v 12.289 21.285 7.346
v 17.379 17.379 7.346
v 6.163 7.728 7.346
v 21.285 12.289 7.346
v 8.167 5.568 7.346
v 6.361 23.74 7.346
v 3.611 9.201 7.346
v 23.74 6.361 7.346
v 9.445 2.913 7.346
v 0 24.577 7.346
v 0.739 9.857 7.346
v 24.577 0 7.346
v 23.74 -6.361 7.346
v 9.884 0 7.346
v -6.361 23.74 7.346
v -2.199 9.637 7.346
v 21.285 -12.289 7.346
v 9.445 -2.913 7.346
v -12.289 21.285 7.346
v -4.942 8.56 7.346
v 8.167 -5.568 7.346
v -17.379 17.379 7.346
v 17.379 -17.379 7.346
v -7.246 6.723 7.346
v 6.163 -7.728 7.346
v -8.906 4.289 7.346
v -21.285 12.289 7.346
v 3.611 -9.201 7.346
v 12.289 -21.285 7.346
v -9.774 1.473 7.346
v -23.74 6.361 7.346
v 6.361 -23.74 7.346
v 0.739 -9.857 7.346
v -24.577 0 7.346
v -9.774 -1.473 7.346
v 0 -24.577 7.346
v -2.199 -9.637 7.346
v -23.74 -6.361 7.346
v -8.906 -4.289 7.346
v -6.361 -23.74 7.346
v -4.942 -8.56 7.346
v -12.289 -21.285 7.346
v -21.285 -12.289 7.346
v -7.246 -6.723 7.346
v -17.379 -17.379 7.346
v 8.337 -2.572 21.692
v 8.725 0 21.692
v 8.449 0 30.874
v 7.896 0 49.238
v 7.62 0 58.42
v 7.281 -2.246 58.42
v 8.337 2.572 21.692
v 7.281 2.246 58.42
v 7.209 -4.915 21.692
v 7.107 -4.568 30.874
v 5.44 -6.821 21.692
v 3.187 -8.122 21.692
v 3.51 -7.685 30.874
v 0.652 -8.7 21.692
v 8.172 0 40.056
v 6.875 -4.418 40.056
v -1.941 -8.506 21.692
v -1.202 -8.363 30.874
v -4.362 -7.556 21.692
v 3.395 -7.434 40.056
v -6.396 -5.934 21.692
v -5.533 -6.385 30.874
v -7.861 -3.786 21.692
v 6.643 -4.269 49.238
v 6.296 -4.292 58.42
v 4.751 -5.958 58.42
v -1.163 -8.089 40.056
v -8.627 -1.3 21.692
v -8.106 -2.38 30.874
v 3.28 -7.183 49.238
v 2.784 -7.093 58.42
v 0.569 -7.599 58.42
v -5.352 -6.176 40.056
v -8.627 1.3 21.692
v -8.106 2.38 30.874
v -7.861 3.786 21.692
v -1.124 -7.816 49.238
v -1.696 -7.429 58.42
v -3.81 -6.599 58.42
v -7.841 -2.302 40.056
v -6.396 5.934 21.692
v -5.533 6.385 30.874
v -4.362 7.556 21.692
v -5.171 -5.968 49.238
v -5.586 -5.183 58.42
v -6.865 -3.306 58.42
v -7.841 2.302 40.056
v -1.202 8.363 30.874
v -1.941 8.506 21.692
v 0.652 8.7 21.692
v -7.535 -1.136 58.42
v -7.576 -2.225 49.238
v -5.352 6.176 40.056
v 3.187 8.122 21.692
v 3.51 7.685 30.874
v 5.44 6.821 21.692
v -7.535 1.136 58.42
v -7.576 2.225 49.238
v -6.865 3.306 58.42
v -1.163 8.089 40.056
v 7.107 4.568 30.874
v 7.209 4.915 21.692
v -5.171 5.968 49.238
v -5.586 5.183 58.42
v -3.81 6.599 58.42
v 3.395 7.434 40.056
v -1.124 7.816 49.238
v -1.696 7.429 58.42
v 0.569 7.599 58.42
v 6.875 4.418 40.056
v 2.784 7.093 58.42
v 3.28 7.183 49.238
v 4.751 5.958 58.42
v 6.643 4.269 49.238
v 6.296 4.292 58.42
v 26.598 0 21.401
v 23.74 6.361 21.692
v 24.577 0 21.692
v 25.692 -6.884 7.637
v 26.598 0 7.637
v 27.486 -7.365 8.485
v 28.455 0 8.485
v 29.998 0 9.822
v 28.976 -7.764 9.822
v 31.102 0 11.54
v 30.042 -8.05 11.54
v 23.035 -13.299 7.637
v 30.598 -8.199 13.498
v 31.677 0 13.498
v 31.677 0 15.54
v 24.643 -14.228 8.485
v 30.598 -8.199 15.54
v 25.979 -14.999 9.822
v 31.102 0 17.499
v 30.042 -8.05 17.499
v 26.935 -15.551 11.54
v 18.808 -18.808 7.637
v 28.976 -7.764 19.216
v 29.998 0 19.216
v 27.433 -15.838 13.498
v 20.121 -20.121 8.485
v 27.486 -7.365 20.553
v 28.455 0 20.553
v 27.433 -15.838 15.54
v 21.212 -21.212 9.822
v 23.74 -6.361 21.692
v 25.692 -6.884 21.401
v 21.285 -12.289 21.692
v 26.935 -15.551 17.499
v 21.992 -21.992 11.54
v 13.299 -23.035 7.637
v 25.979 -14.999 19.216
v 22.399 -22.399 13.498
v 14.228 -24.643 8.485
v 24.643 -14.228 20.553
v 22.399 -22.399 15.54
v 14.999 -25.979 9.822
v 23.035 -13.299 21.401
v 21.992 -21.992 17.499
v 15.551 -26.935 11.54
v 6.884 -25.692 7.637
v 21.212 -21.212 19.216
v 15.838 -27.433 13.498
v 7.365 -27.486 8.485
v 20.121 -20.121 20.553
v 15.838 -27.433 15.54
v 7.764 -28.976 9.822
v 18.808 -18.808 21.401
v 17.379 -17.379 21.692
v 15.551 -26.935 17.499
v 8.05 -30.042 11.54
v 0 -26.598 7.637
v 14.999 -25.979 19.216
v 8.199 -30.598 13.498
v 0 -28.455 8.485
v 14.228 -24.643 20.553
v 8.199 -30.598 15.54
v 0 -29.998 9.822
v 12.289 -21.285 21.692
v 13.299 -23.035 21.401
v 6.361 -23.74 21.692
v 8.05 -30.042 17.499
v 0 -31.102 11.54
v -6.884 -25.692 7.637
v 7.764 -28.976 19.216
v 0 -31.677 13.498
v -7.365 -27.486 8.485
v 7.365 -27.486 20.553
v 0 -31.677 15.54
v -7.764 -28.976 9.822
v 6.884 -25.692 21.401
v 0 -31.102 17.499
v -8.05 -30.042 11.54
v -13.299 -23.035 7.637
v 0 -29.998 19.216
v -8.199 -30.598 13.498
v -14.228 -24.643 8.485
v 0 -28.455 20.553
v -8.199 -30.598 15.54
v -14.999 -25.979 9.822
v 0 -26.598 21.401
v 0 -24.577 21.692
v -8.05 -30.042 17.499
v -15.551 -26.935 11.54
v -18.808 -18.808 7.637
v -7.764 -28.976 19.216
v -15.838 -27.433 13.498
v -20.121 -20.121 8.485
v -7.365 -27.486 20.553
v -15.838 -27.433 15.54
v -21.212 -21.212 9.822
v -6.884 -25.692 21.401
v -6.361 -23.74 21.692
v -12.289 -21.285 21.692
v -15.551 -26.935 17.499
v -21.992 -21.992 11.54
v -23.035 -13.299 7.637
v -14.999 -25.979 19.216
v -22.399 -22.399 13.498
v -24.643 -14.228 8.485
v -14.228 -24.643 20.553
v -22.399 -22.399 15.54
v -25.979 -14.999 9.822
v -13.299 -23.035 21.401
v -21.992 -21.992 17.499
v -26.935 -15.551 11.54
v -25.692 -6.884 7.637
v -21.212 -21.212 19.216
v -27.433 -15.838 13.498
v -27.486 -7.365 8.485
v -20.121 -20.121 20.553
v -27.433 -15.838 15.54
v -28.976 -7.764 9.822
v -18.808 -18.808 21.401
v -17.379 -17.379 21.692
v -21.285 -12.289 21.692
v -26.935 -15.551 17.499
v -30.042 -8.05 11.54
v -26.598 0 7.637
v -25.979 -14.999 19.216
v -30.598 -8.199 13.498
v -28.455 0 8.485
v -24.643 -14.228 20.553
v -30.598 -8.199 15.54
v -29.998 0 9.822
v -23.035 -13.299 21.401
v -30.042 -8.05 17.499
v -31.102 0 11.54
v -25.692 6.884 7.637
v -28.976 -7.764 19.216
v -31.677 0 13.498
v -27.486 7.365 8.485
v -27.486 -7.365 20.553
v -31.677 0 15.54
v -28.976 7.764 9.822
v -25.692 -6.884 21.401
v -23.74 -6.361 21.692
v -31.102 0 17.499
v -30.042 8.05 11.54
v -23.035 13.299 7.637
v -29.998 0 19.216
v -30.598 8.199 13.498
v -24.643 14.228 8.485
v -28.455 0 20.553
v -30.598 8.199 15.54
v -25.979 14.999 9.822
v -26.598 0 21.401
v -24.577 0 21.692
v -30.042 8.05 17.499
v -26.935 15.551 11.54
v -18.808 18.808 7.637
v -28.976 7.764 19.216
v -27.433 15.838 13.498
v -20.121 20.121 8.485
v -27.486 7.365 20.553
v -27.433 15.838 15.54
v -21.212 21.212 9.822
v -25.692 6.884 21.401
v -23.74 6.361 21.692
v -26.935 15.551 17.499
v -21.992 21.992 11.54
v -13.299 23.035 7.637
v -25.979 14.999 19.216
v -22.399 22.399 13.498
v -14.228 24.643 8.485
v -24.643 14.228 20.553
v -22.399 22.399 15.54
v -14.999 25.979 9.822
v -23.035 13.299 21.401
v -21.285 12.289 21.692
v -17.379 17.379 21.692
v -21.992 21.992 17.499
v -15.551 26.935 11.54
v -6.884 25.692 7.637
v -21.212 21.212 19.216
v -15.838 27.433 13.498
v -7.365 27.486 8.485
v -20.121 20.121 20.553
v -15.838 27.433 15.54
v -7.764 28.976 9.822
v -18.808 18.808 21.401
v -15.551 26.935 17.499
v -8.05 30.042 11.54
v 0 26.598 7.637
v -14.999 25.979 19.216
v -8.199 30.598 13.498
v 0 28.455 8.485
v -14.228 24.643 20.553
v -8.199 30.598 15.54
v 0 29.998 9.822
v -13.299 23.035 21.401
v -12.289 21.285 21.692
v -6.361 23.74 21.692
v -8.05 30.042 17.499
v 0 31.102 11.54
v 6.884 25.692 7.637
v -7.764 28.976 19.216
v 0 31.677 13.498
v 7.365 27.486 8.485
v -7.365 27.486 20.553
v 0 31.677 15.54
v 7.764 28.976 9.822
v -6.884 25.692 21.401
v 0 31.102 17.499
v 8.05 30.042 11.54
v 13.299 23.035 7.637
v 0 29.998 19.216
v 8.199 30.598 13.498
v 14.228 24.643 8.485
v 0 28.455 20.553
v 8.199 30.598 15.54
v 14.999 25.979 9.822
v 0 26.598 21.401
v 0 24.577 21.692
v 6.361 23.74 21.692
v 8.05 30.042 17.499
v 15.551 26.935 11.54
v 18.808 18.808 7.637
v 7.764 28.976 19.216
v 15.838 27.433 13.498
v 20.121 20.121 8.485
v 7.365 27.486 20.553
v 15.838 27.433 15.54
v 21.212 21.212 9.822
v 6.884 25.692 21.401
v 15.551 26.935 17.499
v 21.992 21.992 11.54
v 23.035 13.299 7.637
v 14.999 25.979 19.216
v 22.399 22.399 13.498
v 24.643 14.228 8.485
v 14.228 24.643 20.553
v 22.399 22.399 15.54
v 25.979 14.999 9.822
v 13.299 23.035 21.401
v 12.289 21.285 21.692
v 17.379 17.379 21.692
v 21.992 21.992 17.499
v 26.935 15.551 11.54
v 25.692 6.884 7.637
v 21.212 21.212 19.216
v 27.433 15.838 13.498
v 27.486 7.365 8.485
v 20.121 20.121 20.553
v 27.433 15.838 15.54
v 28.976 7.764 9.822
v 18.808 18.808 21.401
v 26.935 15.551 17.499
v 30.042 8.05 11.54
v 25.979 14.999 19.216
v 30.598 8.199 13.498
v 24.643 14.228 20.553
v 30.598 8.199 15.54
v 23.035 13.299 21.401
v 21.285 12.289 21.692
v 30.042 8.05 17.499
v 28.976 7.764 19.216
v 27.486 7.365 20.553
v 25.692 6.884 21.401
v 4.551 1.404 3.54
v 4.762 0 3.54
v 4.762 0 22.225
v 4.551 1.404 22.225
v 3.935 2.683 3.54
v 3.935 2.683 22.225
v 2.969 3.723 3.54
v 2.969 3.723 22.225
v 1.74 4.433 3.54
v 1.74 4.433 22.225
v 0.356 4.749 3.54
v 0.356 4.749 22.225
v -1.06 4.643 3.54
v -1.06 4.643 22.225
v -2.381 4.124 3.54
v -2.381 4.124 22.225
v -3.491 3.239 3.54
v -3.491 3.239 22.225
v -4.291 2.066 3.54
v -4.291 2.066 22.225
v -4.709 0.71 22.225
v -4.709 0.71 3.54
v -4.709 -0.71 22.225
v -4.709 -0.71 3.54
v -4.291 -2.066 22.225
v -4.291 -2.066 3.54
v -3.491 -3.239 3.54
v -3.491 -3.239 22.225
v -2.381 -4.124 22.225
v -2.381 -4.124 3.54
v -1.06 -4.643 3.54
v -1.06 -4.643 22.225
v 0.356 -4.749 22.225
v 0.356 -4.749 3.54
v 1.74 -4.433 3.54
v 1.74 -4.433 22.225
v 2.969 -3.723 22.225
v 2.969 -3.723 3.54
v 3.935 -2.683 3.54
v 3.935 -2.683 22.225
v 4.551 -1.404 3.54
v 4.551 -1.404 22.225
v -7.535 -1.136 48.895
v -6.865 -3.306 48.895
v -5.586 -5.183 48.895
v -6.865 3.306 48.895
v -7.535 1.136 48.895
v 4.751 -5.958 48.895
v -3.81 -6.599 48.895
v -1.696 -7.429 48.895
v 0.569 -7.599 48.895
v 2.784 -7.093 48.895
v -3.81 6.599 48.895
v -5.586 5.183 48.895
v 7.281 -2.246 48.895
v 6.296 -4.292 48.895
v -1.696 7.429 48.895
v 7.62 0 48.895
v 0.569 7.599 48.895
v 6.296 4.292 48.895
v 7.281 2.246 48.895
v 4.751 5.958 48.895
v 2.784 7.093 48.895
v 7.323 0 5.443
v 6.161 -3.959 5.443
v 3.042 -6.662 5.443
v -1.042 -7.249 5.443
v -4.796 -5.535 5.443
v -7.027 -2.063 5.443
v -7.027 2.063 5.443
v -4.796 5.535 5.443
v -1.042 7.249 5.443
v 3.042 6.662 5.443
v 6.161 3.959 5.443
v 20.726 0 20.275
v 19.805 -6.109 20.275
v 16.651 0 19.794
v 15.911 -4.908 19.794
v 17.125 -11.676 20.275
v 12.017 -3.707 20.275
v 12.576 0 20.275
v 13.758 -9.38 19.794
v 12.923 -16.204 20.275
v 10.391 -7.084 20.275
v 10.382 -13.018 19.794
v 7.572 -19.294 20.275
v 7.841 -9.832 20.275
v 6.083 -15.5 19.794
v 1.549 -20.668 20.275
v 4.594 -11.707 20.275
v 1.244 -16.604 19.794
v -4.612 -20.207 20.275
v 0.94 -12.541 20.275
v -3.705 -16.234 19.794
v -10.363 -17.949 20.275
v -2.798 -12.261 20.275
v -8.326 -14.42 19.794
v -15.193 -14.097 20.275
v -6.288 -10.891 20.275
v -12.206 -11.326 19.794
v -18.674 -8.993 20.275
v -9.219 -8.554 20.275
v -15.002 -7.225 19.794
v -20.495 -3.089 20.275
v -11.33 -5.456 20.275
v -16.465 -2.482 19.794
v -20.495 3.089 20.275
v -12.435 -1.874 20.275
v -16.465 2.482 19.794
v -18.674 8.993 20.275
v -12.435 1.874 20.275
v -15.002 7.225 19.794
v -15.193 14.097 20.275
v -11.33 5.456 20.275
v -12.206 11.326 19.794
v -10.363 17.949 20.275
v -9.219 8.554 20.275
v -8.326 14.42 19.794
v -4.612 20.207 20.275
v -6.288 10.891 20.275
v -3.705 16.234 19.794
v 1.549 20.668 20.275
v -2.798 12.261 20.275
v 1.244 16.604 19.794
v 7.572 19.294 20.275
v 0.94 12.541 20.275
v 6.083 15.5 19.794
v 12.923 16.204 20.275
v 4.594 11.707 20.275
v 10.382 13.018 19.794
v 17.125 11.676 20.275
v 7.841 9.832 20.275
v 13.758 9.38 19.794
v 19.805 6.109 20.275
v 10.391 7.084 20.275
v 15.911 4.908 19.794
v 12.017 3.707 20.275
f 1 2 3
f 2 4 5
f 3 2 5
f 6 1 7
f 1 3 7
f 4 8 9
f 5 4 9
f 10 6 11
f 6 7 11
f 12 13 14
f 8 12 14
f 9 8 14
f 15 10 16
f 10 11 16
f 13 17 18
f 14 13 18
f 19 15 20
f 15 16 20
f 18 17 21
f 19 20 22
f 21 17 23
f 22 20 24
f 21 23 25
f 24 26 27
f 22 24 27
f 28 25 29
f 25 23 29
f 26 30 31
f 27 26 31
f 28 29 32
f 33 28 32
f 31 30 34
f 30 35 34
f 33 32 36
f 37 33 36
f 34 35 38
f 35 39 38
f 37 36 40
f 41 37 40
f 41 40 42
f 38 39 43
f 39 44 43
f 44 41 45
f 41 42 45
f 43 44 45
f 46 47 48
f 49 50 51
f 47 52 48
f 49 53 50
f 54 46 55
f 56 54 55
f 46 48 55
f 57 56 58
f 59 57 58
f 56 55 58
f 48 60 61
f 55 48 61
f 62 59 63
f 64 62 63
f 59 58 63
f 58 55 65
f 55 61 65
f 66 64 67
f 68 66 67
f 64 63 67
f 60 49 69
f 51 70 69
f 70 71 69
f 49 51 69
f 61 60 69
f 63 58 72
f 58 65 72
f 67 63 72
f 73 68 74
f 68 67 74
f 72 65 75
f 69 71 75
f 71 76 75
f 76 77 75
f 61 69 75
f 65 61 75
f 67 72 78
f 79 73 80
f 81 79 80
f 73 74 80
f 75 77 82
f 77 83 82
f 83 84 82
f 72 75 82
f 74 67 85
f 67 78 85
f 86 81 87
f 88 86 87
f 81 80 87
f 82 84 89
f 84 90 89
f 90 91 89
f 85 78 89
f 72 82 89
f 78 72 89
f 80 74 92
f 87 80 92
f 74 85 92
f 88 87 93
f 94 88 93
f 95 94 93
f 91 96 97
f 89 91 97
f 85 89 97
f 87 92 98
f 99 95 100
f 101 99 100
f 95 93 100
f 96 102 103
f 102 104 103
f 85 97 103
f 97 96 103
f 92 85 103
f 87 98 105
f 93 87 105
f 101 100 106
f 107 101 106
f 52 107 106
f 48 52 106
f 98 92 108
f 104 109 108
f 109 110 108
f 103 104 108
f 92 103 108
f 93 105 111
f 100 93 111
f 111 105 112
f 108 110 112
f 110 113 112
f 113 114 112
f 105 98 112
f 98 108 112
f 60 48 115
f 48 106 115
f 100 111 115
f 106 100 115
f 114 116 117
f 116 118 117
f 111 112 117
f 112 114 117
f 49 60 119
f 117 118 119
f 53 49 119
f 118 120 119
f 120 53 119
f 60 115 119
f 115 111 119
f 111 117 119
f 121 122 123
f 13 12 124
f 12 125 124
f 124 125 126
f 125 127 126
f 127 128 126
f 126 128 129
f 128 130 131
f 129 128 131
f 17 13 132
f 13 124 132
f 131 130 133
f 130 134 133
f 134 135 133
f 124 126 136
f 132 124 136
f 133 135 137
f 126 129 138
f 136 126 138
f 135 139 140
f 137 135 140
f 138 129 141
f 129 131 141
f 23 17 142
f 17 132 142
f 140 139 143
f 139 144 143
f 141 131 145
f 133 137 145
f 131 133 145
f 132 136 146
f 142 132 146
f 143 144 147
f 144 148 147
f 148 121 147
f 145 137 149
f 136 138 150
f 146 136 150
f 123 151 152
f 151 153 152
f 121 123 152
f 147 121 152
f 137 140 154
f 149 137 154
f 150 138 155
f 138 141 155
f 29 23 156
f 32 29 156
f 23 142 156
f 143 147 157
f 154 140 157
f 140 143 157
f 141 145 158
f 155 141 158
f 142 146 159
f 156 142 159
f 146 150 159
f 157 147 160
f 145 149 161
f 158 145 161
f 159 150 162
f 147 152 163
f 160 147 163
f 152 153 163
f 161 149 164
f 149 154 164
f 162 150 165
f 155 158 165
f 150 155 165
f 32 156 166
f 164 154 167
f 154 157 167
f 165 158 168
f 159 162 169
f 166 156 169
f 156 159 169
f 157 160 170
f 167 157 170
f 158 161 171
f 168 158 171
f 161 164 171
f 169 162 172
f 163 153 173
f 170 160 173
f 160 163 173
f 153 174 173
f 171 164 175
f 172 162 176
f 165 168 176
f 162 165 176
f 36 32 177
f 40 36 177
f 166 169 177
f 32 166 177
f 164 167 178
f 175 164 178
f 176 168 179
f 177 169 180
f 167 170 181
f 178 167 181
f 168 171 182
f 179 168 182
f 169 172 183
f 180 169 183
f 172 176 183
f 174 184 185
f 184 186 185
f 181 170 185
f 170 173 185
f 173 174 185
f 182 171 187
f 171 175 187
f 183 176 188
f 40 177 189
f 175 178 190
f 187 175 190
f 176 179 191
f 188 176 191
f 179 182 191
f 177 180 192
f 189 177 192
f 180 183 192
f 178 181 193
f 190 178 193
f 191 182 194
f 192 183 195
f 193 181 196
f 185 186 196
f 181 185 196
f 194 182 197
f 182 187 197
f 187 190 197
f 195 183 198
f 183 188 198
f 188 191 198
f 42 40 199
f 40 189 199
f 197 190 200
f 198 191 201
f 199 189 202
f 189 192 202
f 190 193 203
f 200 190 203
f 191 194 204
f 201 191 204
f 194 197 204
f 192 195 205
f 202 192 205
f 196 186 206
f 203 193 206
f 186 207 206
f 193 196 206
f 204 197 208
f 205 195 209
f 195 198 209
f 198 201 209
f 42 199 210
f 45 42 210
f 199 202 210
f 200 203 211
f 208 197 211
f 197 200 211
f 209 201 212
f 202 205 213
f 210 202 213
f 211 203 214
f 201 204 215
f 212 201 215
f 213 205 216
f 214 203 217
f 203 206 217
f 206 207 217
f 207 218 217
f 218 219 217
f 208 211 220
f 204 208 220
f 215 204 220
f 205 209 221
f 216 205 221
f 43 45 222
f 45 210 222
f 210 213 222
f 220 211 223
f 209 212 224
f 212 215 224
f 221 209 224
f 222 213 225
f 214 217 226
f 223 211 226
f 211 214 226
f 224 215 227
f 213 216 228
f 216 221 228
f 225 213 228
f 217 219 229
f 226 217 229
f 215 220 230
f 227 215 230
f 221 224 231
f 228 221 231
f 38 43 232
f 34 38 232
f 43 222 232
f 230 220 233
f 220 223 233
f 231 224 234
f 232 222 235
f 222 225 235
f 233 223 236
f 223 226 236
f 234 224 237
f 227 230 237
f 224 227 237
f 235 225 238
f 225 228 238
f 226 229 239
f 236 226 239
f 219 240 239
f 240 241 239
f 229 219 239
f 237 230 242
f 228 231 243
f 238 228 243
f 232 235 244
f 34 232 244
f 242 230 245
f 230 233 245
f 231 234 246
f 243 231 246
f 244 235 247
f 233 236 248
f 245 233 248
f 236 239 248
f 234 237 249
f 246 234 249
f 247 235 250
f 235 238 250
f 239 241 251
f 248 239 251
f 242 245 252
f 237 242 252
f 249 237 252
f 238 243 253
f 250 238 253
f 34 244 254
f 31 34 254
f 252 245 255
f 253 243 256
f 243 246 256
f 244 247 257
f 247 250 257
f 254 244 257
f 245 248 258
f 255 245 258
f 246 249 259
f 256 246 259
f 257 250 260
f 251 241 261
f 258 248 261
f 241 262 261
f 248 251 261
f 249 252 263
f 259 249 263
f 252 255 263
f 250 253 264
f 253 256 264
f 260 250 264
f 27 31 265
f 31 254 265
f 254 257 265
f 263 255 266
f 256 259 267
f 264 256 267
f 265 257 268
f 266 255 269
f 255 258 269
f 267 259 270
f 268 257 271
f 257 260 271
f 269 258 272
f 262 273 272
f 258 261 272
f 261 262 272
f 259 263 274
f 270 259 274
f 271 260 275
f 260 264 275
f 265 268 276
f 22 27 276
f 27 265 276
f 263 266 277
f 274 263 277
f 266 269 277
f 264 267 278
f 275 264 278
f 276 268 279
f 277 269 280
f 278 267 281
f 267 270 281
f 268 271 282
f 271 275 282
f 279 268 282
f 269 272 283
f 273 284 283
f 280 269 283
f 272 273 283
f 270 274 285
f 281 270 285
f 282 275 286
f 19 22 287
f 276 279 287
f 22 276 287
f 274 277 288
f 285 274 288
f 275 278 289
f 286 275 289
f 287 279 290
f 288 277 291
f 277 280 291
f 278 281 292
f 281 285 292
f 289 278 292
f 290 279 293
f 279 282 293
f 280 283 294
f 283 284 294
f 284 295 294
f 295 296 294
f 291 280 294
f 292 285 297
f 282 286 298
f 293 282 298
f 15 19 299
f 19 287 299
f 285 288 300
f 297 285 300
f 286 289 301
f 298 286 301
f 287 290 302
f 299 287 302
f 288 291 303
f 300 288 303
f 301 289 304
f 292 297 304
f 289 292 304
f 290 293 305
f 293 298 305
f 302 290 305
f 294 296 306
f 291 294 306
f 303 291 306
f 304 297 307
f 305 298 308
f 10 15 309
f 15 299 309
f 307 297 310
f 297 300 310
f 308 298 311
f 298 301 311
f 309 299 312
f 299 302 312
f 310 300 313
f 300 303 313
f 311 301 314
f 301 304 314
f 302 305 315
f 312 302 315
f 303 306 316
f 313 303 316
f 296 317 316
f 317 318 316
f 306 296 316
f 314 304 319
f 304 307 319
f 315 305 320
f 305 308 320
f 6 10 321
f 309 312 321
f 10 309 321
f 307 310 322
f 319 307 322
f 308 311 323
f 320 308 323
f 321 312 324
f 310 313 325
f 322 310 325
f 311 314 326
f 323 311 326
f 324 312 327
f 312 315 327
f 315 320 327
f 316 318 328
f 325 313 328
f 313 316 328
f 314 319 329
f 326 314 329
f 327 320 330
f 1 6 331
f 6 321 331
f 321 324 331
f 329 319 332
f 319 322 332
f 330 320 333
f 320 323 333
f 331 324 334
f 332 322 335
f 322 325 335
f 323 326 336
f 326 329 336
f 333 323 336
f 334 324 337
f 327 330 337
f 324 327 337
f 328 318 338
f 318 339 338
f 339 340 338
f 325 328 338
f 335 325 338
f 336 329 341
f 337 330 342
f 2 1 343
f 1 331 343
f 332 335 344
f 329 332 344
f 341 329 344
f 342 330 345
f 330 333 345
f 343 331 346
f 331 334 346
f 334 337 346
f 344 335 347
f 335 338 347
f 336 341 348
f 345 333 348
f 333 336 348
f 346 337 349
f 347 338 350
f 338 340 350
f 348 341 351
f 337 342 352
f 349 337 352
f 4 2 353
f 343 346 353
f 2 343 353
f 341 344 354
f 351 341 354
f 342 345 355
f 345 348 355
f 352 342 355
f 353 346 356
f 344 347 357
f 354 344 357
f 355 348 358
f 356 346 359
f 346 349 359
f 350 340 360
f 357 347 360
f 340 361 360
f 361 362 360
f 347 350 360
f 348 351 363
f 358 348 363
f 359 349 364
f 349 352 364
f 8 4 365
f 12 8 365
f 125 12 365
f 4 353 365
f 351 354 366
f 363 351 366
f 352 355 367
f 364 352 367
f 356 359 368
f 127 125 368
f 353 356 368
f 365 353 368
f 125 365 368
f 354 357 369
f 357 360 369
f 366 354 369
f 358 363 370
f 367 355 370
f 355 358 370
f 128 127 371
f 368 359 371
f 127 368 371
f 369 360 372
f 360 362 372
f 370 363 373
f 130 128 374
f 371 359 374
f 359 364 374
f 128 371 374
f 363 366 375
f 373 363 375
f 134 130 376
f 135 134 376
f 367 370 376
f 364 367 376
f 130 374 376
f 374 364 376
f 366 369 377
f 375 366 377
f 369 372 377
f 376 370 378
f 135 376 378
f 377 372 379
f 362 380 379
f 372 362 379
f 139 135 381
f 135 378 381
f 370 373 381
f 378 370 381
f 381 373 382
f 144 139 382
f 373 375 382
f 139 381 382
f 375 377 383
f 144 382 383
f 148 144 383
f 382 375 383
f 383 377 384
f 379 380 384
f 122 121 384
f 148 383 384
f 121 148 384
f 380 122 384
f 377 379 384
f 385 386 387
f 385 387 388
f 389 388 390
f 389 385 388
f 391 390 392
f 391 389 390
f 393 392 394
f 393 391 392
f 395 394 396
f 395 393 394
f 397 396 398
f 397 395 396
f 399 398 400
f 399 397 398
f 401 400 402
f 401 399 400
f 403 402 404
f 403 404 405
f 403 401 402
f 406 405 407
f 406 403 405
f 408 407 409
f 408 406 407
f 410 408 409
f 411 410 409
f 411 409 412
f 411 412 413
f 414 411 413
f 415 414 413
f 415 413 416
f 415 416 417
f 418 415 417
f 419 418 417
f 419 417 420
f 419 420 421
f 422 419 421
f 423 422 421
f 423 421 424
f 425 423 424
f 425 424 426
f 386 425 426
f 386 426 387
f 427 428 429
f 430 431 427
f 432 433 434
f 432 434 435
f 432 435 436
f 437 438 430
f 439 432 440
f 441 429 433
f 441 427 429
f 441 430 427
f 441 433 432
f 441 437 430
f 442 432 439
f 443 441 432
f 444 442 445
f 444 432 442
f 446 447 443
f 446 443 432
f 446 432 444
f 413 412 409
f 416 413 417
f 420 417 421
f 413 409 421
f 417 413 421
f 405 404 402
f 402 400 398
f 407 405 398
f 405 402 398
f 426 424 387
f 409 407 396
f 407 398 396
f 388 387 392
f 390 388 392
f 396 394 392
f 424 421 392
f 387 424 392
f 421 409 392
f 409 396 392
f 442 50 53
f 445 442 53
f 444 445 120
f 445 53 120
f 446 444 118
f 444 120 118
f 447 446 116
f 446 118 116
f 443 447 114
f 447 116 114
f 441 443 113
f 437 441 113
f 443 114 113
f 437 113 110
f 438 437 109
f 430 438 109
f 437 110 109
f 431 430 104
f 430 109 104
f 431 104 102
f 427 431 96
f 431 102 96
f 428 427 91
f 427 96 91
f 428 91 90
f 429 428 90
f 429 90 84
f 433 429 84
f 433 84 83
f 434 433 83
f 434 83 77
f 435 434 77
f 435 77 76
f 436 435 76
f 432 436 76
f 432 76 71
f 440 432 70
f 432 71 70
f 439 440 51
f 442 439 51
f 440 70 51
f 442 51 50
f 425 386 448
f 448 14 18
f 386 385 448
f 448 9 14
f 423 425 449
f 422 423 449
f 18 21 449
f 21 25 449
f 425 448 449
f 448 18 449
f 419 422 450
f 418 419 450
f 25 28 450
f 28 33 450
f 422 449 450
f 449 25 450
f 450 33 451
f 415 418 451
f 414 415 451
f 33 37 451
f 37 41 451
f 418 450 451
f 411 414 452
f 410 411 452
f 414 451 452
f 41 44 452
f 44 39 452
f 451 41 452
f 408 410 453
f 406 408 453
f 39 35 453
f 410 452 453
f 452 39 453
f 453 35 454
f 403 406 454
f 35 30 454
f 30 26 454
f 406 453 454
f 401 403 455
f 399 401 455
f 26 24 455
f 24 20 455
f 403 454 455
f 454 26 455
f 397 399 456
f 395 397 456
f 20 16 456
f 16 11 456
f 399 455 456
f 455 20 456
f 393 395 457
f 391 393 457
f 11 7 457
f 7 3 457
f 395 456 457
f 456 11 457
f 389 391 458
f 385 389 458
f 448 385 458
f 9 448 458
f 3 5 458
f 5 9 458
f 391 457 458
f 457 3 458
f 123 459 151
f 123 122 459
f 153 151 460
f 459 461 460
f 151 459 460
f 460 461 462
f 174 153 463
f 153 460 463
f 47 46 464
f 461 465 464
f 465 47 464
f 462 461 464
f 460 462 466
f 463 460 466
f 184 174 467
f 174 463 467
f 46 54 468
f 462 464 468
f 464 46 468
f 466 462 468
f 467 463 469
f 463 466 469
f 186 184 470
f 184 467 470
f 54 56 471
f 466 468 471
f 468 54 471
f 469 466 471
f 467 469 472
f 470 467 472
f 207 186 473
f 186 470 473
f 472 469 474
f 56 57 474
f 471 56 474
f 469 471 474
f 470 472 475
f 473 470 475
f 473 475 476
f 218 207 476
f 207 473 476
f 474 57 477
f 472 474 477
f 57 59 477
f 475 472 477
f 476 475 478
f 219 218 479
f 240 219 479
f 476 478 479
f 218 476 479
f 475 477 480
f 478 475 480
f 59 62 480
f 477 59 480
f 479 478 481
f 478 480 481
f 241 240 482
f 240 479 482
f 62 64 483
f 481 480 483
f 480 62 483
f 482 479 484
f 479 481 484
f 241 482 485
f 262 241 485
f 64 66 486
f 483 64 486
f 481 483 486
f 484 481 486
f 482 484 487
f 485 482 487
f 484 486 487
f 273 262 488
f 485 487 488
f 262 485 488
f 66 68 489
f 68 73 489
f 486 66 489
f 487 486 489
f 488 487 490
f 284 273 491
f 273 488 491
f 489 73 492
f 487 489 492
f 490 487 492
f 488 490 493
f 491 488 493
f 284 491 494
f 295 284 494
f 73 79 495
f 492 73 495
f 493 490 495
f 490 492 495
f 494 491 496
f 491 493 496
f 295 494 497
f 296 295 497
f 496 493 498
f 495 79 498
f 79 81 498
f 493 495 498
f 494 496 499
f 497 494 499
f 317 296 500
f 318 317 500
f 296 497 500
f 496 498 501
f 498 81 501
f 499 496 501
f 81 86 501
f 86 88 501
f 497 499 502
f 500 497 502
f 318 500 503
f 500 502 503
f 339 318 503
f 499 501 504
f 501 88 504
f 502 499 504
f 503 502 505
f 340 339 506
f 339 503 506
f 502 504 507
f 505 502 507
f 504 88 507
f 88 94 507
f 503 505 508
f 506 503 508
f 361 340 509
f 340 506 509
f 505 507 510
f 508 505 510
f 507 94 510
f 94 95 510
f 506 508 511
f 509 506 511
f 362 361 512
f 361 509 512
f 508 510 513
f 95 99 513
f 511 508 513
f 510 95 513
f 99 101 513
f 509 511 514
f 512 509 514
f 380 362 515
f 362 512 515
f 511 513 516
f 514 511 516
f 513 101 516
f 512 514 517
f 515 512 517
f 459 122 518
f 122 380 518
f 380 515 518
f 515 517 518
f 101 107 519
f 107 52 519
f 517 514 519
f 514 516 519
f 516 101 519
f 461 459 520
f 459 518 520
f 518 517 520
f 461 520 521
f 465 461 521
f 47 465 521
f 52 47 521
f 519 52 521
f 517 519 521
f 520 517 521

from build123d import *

# Parameters (mm, degrees)
F2_R      = 4.7625
F1_FACE_R = 7.62
F3_DEPTH  = 9.525
F4_DEPTH  = 22.225


# Not quite as in the source:
# - a feature names something its author has since deleted; it is built from what else it names


with BuildPart() as f1:
    # F0 (on Front) → F1 (revolve)
    with BuildSketch(Plane.XZ):
        with BuildLine():
            Line((0, 58.42), (0, 0))
            Line((0, 0), (9.8843732849, 7.3464941233))
            Line((9.8843732849, 7.3464941233), (24.5773624629, 7.3464941233))
            ThreePointArc((24.5773624629, 7.3464941233), (31.75, 14.5191316605), (24.5773624629, 21.6917691976))
            ThreePointArc((24.5773624629, 21.6917691976), (16.6510342816, 19.7936922223), (8.7247061003, 21.6917691976))
            Line((8.7247061003, 21.6917691976), (7.62, 58.42))
            Line((7.62, 58.42), (0, 58.42))
        make_face()
    revolve(axis=Axis((0, 0, 29.21), (0, 0, -1)))

    # F2 (on Top) + F1_face (on face) → F3 (cut)
    with BuildSketch(Plane.XY):
        Circle(F2_R)
    with BuildSketch(Plane.XY.offset(58.42)):
        Circle(F1_FACE_R)
    extrude(amount=-F3_DEPTH, mode=Mode.SUBTRACT)

    # F2 (on Top) → F4 (cut)
    with BuildSketch(Plane.XY):
        Circle(F2_R)
    extrude(amount=F4_DEPTH, mode=Mode.SUBTRACT)


solid = f1.part
